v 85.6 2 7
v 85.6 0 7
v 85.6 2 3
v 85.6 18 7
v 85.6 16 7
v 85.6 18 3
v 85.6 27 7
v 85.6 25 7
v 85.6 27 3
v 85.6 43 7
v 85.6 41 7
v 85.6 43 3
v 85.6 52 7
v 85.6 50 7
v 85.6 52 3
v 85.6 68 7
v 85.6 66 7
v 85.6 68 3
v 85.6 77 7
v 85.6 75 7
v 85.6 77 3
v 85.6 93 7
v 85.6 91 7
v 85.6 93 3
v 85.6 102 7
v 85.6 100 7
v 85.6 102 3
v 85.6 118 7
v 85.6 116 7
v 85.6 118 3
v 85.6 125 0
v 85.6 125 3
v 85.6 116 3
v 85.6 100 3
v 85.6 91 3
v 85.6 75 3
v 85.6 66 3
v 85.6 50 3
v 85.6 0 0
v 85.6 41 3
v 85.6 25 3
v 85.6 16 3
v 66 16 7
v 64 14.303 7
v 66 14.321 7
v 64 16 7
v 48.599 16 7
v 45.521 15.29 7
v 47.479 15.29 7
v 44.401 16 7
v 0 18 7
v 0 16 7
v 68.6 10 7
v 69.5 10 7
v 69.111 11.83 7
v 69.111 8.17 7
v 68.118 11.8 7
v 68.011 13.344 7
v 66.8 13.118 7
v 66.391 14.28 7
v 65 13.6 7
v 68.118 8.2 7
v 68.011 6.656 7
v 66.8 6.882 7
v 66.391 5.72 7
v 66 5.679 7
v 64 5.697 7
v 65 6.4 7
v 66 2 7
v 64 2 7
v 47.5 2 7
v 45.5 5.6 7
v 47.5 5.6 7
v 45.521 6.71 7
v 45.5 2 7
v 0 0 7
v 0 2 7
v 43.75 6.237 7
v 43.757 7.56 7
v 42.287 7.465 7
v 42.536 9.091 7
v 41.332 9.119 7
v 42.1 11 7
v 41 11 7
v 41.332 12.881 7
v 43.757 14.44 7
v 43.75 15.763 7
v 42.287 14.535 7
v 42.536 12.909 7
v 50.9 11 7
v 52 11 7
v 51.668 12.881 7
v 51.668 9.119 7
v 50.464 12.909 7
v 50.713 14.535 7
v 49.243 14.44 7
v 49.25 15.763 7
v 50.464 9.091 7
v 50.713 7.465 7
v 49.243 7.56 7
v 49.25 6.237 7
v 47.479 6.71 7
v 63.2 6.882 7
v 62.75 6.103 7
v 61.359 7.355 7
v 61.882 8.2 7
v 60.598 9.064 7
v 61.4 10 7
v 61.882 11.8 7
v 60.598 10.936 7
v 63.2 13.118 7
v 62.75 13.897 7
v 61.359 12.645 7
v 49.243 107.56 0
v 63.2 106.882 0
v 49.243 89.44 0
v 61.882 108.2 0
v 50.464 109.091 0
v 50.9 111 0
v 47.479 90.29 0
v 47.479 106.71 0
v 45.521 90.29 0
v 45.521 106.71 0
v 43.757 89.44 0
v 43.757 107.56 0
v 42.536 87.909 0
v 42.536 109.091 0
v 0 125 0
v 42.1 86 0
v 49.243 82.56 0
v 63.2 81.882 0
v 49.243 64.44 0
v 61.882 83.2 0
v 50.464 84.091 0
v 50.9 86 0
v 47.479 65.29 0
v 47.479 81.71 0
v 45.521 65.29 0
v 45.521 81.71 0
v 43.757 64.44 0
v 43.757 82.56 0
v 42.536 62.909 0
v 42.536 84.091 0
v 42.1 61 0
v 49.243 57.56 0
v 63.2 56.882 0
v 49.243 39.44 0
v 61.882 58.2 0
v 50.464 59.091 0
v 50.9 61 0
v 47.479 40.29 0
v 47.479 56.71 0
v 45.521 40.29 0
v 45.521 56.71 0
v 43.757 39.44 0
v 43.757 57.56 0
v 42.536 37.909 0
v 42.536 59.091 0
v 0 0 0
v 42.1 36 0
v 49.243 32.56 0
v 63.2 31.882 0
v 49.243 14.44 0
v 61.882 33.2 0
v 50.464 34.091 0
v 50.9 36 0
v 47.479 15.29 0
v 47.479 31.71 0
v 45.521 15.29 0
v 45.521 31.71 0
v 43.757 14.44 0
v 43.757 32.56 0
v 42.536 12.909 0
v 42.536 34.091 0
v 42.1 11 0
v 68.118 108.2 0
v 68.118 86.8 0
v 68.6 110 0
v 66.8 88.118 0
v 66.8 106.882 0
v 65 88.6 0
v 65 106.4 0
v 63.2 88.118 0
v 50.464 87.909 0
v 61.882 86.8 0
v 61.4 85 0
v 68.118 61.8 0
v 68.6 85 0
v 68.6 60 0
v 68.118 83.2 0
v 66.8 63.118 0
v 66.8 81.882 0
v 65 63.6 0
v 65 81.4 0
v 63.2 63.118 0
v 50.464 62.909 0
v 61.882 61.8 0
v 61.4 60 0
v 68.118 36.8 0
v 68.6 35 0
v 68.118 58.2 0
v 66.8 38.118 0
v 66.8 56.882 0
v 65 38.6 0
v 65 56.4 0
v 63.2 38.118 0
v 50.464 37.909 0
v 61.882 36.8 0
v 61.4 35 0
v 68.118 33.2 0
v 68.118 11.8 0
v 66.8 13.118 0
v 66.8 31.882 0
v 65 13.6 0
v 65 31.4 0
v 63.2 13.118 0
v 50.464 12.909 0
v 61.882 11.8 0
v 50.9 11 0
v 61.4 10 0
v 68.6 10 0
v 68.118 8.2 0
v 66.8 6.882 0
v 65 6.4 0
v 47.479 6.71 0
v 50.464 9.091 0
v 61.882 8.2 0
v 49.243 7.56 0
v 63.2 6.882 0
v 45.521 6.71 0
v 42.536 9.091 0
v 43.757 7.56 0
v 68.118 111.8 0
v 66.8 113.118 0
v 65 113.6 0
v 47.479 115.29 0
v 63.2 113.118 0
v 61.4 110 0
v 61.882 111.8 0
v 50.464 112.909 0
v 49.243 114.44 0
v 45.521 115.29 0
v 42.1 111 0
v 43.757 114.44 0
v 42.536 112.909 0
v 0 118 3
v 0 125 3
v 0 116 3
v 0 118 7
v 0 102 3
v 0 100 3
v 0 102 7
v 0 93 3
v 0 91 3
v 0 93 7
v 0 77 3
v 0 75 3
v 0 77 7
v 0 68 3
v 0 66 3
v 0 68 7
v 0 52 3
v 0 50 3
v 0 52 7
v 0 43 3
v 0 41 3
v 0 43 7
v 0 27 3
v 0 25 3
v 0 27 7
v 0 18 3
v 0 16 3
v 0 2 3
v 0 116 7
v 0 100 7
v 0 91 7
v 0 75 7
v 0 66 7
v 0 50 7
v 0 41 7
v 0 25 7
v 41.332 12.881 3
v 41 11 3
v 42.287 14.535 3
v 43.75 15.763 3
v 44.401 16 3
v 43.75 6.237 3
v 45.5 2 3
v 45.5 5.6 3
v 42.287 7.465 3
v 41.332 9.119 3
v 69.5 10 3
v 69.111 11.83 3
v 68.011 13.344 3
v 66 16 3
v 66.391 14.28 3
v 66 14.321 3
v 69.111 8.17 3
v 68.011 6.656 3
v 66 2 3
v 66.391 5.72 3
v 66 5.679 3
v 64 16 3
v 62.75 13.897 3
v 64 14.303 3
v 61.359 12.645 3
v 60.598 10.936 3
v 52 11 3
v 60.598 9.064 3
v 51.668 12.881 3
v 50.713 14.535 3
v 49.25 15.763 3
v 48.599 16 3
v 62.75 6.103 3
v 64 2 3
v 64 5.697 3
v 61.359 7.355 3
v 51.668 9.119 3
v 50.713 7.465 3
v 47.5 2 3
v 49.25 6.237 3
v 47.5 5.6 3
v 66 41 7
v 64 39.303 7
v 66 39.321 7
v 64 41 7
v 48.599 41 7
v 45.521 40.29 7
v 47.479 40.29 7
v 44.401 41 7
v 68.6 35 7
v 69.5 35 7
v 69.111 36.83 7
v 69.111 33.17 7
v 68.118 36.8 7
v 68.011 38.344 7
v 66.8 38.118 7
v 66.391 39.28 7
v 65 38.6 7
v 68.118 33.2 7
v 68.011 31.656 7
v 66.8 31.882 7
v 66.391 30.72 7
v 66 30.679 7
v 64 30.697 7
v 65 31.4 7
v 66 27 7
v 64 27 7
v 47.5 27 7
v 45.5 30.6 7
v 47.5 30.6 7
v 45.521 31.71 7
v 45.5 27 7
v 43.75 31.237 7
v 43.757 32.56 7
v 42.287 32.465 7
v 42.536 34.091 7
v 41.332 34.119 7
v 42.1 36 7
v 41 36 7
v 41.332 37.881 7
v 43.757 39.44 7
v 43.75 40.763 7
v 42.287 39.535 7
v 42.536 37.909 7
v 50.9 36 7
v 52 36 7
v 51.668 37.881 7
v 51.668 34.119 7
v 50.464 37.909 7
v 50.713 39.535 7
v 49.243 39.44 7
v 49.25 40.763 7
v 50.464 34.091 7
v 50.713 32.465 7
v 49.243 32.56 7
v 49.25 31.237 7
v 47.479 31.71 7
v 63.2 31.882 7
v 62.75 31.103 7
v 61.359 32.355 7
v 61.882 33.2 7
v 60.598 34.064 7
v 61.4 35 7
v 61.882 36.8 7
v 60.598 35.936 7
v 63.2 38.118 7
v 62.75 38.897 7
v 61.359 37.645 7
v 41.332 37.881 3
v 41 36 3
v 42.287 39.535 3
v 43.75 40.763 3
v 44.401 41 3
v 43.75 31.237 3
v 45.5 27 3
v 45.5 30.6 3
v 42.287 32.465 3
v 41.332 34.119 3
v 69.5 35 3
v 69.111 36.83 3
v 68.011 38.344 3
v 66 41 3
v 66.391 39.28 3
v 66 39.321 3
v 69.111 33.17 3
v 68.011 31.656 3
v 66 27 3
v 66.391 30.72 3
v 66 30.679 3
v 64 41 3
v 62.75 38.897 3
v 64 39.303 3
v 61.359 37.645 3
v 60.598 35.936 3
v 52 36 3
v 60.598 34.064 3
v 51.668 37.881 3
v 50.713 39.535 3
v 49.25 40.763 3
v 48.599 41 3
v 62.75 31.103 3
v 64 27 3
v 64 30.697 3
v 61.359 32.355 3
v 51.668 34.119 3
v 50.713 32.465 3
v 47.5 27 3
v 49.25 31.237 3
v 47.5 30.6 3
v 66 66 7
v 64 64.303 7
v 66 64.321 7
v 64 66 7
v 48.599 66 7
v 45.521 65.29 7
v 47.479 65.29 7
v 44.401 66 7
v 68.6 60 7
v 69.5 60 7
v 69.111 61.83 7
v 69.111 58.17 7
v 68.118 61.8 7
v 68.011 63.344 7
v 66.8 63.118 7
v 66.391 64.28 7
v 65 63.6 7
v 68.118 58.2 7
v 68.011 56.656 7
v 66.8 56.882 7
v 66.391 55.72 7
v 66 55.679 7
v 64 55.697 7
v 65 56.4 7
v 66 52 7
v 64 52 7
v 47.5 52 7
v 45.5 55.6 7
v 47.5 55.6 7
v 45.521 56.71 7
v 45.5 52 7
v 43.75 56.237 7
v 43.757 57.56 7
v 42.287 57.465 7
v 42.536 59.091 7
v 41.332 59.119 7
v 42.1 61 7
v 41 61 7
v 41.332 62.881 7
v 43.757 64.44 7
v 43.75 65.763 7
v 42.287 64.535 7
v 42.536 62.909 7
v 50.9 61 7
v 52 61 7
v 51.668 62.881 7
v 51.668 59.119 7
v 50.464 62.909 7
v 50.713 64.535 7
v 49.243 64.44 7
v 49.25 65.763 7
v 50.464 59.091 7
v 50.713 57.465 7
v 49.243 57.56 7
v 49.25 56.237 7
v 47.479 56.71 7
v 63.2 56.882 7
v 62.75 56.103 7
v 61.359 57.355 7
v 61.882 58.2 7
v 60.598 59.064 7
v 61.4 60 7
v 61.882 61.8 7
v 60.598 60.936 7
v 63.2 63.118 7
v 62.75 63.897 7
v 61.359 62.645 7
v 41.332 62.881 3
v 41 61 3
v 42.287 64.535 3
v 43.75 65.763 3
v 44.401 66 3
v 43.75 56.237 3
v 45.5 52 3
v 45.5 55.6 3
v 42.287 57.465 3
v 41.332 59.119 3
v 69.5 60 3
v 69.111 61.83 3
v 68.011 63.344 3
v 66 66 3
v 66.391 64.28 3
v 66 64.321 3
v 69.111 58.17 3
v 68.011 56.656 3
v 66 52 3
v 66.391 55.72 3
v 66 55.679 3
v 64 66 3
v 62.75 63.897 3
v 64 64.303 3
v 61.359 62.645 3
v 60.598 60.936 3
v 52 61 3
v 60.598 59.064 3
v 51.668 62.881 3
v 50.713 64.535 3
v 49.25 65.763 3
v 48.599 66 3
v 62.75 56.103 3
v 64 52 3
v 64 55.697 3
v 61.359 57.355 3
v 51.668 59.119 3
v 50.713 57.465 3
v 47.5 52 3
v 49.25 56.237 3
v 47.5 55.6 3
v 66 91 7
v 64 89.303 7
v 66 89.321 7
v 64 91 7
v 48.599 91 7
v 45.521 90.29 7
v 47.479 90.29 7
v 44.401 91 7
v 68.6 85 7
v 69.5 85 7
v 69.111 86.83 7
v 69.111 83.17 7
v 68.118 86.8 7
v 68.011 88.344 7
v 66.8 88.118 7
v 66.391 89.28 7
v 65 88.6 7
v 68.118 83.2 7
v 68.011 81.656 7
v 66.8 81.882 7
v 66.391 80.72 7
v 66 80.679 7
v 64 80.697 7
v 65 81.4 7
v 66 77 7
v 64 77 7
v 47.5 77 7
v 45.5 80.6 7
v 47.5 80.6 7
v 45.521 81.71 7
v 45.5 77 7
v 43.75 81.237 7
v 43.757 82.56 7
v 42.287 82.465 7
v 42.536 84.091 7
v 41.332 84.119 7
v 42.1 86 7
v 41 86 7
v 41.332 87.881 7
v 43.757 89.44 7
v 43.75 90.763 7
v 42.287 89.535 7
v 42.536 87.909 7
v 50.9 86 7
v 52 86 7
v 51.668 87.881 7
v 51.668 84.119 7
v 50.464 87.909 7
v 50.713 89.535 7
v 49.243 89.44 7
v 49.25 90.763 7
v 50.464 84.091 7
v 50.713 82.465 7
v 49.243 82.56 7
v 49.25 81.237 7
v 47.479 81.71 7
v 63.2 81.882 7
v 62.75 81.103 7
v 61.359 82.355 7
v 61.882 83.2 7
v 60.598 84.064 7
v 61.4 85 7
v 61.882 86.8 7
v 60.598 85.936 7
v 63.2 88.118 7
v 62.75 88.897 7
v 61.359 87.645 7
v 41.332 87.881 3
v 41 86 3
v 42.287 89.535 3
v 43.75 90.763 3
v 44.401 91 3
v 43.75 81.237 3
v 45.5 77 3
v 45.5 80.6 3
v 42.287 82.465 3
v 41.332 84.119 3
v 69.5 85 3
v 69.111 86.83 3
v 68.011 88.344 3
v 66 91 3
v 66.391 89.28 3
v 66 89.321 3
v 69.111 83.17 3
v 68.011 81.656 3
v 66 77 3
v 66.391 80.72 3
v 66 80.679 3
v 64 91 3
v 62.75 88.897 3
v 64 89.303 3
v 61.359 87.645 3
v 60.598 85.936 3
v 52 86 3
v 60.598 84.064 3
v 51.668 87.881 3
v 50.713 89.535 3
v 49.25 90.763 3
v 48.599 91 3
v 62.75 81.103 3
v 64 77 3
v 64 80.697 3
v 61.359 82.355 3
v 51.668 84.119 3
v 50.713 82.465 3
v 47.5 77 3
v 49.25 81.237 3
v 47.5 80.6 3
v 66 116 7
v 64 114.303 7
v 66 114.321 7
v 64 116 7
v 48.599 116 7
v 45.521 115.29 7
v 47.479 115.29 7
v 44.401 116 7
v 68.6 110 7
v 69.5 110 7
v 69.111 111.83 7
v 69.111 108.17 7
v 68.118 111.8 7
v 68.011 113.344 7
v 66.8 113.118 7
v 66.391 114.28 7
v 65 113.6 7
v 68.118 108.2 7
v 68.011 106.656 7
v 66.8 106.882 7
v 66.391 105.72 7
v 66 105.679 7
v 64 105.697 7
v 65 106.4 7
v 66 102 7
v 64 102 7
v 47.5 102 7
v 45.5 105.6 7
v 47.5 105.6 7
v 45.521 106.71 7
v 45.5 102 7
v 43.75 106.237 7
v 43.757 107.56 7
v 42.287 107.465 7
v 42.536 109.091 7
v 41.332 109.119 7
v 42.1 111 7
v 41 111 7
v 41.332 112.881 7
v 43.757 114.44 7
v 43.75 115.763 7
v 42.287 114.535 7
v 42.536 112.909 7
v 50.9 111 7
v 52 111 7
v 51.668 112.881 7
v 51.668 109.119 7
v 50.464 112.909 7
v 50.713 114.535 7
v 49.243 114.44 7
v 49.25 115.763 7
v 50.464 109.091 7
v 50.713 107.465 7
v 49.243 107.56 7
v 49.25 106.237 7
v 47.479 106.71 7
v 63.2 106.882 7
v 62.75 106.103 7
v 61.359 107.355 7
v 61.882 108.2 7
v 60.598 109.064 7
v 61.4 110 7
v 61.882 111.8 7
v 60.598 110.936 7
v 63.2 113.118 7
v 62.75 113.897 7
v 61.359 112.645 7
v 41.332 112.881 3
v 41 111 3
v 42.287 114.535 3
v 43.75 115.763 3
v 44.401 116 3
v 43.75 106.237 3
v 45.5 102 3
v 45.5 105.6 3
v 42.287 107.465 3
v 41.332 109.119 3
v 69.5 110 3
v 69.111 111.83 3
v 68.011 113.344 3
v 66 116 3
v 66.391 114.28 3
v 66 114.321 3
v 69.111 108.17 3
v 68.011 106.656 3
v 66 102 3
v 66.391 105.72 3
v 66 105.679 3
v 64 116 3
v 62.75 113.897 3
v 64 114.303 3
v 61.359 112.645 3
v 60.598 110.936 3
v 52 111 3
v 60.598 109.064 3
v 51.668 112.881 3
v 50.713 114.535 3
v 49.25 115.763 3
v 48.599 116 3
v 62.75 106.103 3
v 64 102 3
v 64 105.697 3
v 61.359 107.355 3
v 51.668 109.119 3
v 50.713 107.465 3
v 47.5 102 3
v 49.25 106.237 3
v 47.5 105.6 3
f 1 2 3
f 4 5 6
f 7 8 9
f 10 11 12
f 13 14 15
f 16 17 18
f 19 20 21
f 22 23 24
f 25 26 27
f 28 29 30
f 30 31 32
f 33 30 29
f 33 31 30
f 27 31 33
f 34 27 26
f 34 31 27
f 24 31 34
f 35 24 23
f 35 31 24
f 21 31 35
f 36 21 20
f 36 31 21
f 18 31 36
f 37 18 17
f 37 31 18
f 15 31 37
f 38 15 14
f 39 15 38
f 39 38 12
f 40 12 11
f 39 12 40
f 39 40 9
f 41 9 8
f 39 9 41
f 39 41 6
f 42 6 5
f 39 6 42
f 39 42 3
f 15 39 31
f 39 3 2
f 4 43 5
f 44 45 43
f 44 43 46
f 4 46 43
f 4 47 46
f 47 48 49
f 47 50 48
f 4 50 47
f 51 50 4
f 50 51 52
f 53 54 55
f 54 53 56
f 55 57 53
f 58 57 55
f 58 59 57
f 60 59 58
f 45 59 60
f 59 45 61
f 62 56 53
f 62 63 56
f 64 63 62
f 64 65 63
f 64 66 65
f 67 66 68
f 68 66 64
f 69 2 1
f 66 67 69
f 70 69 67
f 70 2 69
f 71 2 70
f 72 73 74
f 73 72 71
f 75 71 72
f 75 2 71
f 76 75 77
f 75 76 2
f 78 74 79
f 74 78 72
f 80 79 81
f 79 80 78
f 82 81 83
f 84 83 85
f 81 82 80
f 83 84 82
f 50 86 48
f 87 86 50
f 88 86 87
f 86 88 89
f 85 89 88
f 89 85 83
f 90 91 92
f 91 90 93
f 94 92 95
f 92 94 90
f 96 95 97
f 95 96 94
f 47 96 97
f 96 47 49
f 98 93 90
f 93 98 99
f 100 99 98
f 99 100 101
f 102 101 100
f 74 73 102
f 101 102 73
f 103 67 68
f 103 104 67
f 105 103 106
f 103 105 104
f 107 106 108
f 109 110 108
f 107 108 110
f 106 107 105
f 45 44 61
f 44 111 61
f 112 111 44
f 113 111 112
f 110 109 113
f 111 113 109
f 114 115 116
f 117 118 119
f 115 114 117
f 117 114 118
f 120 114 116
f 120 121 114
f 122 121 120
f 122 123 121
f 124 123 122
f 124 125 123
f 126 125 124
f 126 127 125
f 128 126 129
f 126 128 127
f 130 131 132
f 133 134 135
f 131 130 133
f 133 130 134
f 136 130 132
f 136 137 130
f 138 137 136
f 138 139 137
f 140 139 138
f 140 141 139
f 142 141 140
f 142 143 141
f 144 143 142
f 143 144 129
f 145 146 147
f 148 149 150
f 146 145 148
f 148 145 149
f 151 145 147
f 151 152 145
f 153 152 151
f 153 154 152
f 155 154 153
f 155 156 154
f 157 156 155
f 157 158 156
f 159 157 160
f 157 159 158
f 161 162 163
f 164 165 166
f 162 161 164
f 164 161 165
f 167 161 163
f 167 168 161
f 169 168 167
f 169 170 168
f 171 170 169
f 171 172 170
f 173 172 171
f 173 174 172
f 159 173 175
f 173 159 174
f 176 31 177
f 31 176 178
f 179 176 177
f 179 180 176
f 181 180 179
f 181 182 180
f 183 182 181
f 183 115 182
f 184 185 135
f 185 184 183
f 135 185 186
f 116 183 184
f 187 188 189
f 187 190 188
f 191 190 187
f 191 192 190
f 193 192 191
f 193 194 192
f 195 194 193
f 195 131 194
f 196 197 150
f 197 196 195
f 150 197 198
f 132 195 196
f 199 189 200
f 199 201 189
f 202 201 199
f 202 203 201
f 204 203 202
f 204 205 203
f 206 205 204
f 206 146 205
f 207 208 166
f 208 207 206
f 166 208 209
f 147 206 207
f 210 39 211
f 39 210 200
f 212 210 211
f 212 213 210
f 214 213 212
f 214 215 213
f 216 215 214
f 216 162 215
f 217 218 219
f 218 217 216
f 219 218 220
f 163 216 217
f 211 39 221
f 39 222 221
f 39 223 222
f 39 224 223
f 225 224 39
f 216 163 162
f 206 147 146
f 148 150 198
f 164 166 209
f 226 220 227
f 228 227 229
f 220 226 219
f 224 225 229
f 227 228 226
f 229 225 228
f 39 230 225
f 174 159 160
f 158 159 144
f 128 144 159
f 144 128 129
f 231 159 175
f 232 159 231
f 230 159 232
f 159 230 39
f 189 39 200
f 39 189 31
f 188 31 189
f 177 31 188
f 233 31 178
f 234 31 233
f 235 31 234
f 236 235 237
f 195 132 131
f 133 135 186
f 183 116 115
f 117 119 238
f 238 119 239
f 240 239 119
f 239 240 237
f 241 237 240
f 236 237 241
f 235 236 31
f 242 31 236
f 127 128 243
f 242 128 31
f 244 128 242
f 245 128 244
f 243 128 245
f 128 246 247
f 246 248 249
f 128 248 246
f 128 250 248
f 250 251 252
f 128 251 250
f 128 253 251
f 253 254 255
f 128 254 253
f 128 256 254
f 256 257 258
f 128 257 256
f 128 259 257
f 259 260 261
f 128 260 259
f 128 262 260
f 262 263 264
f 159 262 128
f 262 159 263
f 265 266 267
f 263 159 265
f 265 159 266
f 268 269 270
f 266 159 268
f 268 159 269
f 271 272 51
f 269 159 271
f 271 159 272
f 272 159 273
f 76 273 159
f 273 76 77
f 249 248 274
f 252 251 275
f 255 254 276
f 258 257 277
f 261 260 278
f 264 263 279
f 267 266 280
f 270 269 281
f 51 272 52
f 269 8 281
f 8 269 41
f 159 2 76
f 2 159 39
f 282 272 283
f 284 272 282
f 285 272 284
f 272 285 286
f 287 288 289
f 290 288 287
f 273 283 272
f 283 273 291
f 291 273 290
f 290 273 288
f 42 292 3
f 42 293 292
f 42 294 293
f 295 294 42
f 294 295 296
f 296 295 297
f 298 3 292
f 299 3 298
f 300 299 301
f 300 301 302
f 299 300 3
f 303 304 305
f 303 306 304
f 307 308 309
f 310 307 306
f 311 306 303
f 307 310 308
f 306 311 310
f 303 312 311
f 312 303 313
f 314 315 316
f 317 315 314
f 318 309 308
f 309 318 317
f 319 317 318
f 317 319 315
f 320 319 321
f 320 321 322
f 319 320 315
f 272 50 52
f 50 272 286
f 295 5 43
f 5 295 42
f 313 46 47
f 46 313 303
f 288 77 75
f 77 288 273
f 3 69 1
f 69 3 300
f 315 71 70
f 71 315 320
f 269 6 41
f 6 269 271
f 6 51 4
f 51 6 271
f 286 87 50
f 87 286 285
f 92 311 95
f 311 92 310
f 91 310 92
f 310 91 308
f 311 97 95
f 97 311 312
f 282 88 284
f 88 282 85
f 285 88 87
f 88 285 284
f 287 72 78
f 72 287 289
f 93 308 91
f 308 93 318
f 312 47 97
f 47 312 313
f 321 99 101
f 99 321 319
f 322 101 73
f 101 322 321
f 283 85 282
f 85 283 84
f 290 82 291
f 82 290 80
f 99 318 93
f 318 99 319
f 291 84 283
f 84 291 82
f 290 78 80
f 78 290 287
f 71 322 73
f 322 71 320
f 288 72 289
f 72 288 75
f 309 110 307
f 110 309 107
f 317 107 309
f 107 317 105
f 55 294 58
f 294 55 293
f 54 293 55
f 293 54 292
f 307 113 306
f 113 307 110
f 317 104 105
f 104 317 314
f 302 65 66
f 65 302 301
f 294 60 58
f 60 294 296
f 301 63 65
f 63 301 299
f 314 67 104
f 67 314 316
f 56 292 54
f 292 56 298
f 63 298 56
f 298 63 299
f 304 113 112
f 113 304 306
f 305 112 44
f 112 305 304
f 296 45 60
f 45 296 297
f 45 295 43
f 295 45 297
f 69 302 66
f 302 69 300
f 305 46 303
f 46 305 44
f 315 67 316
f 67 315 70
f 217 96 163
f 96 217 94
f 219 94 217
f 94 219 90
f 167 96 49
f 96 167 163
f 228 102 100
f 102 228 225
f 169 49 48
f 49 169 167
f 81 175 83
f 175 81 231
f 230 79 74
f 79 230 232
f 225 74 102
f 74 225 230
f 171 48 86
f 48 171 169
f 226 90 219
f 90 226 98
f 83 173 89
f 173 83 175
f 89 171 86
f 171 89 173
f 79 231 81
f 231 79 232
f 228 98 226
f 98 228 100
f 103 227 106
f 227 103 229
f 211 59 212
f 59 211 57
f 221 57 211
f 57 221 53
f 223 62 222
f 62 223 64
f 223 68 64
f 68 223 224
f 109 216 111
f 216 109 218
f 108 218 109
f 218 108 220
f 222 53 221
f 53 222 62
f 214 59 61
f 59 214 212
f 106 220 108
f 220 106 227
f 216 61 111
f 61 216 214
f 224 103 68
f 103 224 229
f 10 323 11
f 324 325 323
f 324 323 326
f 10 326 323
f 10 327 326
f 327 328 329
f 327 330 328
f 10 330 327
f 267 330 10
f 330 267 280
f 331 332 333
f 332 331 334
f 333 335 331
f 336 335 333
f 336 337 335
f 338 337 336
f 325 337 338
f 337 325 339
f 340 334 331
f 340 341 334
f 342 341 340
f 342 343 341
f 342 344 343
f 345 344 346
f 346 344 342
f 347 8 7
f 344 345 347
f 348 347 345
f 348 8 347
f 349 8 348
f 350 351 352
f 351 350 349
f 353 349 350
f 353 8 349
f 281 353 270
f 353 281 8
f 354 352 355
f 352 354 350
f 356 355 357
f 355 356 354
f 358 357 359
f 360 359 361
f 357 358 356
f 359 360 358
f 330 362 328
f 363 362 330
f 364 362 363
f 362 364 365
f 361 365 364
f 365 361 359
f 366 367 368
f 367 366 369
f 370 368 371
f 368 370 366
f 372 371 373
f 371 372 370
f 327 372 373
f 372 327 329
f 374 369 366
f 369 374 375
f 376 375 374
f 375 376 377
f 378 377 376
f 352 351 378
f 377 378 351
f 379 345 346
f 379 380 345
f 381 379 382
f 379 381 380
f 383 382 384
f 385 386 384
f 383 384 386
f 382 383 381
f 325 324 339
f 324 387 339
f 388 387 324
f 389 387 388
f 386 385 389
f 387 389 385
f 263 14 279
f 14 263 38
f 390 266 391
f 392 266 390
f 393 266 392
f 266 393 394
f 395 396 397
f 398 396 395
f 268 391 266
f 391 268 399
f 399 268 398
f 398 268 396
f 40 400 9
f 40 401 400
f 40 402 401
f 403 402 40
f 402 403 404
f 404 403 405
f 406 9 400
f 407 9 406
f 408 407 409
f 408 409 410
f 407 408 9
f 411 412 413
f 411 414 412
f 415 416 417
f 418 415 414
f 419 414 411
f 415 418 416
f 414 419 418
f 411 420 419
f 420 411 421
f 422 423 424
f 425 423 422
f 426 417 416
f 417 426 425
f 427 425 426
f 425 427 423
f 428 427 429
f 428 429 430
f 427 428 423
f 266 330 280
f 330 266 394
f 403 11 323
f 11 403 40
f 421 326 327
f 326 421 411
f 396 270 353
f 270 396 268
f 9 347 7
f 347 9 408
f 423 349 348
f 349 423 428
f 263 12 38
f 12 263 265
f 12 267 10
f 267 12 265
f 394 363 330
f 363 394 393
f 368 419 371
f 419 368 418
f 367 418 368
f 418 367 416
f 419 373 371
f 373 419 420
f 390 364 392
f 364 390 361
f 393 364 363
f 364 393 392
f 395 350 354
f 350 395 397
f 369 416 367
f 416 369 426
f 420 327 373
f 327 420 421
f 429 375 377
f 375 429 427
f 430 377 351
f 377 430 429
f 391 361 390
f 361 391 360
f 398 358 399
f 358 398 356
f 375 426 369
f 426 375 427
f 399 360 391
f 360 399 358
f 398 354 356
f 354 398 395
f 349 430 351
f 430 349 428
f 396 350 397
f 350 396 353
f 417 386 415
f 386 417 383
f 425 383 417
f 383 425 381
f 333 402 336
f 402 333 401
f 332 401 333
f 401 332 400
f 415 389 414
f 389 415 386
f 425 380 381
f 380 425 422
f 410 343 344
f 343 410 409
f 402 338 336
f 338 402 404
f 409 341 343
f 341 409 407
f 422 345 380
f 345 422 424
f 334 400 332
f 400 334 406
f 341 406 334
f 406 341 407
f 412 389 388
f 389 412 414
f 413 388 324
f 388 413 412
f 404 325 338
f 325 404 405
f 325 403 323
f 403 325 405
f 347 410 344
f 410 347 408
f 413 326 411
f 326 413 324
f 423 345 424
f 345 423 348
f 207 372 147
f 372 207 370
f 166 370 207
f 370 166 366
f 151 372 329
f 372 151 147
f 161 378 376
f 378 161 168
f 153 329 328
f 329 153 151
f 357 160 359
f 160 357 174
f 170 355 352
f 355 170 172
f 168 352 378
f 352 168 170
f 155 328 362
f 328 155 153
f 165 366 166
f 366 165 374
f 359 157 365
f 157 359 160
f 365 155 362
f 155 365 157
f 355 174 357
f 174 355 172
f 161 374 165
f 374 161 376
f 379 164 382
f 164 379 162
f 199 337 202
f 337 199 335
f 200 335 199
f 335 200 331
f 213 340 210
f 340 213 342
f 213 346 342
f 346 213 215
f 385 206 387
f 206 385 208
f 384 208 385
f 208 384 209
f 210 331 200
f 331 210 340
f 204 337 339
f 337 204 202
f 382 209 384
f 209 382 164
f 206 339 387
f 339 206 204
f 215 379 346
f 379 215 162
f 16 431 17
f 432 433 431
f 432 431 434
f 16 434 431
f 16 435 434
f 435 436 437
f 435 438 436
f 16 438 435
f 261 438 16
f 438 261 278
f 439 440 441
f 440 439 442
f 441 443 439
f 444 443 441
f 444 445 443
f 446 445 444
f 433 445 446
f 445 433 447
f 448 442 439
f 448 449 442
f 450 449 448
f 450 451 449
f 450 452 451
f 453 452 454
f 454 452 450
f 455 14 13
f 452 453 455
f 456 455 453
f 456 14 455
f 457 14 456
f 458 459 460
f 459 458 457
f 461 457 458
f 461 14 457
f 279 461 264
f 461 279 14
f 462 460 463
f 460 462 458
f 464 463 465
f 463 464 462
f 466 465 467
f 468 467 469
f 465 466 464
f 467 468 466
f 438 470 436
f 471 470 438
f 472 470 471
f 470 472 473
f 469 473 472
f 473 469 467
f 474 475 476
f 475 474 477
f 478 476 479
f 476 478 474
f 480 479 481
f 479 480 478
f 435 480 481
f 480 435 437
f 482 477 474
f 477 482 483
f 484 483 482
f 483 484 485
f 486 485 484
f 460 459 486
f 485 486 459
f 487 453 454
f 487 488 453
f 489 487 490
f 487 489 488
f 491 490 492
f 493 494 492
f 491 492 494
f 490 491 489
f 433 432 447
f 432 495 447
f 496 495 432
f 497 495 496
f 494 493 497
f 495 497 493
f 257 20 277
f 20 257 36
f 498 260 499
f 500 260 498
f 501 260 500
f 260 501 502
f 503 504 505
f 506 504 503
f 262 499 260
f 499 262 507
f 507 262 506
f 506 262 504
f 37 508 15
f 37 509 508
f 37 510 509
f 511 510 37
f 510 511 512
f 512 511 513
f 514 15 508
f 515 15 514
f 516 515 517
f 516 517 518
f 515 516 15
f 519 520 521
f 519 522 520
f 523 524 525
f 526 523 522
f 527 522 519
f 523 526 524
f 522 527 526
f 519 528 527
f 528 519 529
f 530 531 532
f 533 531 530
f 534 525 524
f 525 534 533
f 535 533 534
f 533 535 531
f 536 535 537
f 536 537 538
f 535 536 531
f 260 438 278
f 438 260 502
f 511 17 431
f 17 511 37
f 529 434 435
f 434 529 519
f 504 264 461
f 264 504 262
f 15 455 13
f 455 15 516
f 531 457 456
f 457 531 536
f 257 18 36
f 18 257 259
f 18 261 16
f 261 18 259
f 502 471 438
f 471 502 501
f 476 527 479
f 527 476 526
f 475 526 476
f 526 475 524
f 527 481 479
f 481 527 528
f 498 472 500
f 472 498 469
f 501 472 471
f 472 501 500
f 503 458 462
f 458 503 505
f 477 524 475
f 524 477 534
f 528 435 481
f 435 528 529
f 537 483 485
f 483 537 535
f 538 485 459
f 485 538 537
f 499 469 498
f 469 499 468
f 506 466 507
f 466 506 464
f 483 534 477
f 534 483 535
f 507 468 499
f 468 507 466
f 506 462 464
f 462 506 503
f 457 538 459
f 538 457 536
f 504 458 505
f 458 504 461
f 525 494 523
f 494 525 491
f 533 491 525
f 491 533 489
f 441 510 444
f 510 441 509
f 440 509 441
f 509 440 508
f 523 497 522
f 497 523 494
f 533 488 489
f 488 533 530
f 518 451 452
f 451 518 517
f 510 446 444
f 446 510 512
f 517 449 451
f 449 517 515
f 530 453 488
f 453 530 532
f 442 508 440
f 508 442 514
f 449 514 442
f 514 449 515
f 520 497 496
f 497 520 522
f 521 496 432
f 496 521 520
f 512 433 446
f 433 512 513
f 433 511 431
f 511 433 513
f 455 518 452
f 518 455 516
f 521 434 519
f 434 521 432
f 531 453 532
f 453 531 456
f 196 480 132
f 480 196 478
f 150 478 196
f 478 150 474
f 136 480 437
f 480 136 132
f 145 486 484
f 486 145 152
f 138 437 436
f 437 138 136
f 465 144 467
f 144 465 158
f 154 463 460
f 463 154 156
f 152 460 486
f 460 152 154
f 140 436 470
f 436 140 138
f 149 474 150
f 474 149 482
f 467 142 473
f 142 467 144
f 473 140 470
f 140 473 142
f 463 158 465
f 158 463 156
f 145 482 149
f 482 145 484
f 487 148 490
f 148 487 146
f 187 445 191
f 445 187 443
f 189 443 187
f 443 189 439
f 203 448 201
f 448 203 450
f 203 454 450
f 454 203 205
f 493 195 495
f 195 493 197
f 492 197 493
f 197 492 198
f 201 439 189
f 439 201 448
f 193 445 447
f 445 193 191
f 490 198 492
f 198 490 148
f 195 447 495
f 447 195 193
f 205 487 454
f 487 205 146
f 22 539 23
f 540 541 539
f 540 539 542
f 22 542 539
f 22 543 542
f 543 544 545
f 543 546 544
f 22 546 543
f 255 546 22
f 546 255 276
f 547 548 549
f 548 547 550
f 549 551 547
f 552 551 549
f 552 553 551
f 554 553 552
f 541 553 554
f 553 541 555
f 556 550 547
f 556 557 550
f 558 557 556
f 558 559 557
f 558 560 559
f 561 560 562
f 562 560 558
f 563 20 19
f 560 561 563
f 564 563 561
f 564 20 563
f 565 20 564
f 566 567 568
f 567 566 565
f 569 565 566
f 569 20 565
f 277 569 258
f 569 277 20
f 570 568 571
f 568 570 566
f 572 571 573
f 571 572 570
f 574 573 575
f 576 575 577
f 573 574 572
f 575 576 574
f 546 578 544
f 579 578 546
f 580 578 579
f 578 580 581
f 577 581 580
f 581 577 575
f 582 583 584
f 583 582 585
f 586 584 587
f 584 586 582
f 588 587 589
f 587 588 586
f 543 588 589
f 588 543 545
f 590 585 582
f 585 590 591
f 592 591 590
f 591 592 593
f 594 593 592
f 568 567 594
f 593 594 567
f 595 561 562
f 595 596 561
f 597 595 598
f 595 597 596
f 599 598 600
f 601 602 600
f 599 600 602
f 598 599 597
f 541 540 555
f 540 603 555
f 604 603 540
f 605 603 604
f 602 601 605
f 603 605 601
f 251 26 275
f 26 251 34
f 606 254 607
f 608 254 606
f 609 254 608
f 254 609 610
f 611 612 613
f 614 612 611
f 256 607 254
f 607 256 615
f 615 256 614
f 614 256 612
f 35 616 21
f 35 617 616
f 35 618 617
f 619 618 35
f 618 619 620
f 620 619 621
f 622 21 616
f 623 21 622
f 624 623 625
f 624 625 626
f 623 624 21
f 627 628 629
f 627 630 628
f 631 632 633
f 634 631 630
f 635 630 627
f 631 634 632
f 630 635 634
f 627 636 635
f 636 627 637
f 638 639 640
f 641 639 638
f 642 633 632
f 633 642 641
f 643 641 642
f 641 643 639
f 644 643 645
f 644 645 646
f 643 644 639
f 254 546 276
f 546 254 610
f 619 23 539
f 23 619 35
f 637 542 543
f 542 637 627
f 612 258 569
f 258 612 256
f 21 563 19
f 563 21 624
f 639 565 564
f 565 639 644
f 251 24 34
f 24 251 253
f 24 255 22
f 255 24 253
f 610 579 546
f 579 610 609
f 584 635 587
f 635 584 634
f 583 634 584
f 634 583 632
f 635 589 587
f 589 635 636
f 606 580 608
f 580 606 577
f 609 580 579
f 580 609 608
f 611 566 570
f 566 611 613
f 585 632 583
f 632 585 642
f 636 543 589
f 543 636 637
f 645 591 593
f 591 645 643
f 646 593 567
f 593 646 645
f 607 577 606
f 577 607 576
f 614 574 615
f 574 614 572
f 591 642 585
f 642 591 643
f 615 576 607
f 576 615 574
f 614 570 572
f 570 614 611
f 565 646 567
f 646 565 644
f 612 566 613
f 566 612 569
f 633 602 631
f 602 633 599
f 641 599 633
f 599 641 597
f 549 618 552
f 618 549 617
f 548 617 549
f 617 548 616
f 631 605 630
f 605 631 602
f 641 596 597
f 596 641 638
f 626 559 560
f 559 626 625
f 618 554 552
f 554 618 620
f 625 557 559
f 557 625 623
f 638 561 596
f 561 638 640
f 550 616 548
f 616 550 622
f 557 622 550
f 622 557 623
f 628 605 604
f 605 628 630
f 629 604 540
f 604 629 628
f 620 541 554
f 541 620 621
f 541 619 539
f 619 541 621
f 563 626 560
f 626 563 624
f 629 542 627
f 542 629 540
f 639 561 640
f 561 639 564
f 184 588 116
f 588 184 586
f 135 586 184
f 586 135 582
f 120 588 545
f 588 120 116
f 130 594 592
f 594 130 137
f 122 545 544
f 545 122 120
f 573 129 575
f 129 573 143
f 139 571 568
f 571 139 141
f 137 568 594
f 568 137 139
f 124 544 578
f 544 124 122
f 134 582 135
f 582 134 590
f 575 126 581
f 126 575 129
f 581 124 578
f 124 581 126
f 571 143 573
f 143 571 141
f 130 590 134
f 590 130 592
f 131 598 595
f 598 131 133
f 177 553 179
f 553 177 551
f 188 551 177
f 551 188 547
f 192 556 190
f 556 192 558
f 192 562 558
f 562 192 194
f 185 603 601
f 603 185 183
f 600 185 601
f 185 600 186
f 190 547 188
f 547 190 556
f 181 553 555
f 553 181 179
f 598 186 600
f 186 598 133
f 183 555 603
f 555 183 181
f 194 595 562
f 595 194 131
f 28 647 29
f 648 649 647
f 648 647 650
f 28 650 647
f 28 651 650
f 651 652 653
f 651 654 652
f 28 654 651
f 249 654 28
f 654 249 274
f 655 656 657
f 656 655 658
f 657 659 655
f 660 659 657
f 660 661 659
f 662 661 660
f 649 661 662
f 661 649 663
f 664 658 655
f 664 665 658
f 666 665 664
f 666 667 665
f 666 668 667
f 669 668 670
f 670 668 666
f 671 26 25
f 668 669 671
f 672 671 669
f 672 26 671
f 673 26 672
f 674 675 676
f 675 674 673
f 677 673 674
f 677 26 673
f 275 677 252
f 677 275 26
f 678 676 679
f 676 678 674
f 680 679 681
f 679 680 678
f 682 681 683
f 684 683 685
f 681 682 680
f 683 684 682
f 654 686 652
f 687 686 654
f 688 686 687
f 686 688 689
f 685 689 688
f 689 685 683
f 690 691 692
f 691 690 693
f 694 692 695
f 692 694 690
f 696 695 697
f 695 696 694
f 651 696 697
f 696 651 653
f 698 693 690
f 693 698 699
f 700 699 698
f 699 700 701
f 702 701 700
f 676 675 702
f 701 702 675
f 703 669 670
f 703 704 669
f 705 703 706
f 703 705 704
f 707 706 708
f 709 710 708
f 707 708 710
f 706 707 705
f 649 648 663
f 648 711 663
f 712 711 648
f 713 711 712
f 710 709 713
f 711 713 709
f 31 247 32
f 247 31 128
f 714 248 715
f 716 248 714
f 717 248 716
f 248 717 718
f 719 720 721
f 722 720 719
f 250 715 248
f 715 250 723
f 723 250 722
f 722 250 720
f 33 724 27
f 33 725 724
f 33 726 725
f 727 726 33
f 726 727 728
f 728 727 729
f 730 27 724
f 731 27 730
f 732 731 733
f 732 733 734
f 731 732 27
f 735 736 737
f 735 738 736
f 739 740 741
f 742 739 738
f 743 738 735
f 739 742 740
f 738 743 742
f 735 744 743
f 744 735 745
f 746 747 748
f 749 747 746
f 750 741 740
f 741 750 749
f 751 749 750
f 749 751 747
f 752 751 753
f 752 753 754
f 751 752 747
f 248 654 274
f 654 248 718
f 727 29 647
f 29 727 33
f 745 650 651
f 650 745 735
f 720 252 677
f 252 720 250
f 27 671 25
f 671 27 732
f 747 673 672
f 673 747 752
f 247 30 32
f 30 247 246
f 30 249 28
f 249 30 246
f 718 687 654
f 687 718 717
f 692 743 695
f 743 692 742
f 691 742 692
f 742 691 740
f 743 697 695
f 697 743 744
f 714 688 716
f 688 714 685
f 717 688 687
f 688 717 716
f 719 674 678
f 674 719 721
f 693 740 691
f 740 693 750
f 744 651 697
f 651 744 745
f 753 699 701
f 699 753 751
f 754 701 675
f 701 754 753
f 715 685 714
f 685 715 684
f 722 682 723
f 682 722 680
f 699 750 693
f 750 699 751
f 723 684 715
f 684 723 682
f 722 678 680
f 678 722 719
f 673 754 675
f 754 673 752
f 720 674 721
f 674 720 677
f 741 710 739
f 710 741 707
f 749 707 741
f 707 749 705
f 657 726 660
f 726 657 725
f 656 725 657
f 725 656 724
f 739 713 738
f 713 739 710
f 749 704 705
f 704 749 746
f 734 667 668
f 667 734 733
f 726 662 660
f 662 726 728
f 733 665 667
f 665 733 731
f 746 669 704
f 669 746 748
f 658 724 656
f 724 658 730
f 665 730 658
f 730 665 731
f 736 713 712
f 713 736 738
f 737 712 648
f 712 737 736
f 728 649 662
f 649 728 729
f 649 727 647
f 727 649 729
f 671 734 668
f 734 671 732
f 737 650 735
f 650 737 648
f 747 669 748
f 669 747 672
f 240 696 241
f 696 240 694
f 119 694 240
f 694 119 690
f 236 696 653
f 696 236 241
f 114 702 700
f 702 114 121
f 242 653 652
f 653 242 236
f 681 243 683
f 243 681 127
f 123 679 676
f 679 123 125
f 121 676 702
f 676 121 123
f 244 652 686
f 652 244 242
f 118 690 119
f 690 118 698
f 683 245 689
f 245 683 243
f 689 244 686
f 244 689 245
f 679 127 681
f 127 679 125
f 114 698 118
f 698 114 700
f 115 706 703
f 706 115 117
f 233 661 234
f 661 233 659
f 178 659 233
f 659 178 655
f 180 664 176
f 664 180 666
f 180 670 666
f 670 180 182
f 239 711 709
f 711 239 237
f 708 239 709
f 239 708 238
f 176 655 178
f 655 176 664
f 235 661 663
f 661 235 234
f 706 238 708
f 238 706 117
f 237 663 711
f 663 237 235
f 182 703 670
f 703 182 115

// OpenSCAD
/*
 * A mounting platform for a "rack" of 5 Raspberry Pi boards
 */

rca_pos = [46.5,11,0];
audio_pos = [65,10,0];

// Used to build dovetails, if you want
snap1_pos = [5,-3,0];
snap2_pos = [70,-3,0];

module base() {
    // carve out a base cube to provide two support ridges:
    // one for the board and another place to hold an expansion board

	difference(){
  		difference(){
  			cube([85.6,25.0,7]);
			translate([0,2,3])
				cube([90,14,5]);
		}
		translate([0,18,3])
			cube([90,12,5]);
	}
}

module load_bearing() {
    // these will surround the RCA and audio jacks and provide some rigidity

	union() {
		base();
		translate(rca_pos)
			cylinder(h = 7, r = 5.5, center = false
);
		translate(rca_pos - [1,10,0])
			cube([2,16,7], center = false);

		translate(audio_pos)
			cylinder(h = 7, r = 4.5, center = false);

		translate(audio_pos - [1,9,0])
			cube([2,13,7], center = false);

		translate(audio_pos + [-1,2,0])
			cube([2,5,7], center = false);
	}
}


module holes() {
    // punch out all the holes at once

	union() {
		translate(rca_pos)
			cylinder(h = 9, r = 4.4, center = false);
		translate(audio_pos)
			cylinder(h = 9, r = 3.6, center = false);
	}

    // not going to use the dovetails
/*
	translate([0,22,0])
		union() {
			translate(snap1_pos)
				scale([1.1,1.1,1])
					triangle();
			translate(snap2_pos)
				scale([1.1,1.1,1])
					triangle();
		}
*/
}


module triangle (side=10, height=3, center=false) {
    // base triangle for dovetails

	translate(center==true ? [-side/2,-sqrt(3)*side/6,-height/2] : [0,0,0])	
		linear_extrude(height=height)
			polygon(points=[[0,0],[side,0],[side/2,sqrt(3)*side/2]]);
}


module dovetails() {
	union() {
		translate(snap1_pos)
			triangle();
		translate(snap2_pos)
			triangle();
	}
}

module single(){
union() {
   // dovetails();
	difference() {
		load_bearing();
		holes();
	}
}
}

// make 5 in a row
for(y = [0,25,50,75,100]) {
	translate([0,y,0])
		single();
}
